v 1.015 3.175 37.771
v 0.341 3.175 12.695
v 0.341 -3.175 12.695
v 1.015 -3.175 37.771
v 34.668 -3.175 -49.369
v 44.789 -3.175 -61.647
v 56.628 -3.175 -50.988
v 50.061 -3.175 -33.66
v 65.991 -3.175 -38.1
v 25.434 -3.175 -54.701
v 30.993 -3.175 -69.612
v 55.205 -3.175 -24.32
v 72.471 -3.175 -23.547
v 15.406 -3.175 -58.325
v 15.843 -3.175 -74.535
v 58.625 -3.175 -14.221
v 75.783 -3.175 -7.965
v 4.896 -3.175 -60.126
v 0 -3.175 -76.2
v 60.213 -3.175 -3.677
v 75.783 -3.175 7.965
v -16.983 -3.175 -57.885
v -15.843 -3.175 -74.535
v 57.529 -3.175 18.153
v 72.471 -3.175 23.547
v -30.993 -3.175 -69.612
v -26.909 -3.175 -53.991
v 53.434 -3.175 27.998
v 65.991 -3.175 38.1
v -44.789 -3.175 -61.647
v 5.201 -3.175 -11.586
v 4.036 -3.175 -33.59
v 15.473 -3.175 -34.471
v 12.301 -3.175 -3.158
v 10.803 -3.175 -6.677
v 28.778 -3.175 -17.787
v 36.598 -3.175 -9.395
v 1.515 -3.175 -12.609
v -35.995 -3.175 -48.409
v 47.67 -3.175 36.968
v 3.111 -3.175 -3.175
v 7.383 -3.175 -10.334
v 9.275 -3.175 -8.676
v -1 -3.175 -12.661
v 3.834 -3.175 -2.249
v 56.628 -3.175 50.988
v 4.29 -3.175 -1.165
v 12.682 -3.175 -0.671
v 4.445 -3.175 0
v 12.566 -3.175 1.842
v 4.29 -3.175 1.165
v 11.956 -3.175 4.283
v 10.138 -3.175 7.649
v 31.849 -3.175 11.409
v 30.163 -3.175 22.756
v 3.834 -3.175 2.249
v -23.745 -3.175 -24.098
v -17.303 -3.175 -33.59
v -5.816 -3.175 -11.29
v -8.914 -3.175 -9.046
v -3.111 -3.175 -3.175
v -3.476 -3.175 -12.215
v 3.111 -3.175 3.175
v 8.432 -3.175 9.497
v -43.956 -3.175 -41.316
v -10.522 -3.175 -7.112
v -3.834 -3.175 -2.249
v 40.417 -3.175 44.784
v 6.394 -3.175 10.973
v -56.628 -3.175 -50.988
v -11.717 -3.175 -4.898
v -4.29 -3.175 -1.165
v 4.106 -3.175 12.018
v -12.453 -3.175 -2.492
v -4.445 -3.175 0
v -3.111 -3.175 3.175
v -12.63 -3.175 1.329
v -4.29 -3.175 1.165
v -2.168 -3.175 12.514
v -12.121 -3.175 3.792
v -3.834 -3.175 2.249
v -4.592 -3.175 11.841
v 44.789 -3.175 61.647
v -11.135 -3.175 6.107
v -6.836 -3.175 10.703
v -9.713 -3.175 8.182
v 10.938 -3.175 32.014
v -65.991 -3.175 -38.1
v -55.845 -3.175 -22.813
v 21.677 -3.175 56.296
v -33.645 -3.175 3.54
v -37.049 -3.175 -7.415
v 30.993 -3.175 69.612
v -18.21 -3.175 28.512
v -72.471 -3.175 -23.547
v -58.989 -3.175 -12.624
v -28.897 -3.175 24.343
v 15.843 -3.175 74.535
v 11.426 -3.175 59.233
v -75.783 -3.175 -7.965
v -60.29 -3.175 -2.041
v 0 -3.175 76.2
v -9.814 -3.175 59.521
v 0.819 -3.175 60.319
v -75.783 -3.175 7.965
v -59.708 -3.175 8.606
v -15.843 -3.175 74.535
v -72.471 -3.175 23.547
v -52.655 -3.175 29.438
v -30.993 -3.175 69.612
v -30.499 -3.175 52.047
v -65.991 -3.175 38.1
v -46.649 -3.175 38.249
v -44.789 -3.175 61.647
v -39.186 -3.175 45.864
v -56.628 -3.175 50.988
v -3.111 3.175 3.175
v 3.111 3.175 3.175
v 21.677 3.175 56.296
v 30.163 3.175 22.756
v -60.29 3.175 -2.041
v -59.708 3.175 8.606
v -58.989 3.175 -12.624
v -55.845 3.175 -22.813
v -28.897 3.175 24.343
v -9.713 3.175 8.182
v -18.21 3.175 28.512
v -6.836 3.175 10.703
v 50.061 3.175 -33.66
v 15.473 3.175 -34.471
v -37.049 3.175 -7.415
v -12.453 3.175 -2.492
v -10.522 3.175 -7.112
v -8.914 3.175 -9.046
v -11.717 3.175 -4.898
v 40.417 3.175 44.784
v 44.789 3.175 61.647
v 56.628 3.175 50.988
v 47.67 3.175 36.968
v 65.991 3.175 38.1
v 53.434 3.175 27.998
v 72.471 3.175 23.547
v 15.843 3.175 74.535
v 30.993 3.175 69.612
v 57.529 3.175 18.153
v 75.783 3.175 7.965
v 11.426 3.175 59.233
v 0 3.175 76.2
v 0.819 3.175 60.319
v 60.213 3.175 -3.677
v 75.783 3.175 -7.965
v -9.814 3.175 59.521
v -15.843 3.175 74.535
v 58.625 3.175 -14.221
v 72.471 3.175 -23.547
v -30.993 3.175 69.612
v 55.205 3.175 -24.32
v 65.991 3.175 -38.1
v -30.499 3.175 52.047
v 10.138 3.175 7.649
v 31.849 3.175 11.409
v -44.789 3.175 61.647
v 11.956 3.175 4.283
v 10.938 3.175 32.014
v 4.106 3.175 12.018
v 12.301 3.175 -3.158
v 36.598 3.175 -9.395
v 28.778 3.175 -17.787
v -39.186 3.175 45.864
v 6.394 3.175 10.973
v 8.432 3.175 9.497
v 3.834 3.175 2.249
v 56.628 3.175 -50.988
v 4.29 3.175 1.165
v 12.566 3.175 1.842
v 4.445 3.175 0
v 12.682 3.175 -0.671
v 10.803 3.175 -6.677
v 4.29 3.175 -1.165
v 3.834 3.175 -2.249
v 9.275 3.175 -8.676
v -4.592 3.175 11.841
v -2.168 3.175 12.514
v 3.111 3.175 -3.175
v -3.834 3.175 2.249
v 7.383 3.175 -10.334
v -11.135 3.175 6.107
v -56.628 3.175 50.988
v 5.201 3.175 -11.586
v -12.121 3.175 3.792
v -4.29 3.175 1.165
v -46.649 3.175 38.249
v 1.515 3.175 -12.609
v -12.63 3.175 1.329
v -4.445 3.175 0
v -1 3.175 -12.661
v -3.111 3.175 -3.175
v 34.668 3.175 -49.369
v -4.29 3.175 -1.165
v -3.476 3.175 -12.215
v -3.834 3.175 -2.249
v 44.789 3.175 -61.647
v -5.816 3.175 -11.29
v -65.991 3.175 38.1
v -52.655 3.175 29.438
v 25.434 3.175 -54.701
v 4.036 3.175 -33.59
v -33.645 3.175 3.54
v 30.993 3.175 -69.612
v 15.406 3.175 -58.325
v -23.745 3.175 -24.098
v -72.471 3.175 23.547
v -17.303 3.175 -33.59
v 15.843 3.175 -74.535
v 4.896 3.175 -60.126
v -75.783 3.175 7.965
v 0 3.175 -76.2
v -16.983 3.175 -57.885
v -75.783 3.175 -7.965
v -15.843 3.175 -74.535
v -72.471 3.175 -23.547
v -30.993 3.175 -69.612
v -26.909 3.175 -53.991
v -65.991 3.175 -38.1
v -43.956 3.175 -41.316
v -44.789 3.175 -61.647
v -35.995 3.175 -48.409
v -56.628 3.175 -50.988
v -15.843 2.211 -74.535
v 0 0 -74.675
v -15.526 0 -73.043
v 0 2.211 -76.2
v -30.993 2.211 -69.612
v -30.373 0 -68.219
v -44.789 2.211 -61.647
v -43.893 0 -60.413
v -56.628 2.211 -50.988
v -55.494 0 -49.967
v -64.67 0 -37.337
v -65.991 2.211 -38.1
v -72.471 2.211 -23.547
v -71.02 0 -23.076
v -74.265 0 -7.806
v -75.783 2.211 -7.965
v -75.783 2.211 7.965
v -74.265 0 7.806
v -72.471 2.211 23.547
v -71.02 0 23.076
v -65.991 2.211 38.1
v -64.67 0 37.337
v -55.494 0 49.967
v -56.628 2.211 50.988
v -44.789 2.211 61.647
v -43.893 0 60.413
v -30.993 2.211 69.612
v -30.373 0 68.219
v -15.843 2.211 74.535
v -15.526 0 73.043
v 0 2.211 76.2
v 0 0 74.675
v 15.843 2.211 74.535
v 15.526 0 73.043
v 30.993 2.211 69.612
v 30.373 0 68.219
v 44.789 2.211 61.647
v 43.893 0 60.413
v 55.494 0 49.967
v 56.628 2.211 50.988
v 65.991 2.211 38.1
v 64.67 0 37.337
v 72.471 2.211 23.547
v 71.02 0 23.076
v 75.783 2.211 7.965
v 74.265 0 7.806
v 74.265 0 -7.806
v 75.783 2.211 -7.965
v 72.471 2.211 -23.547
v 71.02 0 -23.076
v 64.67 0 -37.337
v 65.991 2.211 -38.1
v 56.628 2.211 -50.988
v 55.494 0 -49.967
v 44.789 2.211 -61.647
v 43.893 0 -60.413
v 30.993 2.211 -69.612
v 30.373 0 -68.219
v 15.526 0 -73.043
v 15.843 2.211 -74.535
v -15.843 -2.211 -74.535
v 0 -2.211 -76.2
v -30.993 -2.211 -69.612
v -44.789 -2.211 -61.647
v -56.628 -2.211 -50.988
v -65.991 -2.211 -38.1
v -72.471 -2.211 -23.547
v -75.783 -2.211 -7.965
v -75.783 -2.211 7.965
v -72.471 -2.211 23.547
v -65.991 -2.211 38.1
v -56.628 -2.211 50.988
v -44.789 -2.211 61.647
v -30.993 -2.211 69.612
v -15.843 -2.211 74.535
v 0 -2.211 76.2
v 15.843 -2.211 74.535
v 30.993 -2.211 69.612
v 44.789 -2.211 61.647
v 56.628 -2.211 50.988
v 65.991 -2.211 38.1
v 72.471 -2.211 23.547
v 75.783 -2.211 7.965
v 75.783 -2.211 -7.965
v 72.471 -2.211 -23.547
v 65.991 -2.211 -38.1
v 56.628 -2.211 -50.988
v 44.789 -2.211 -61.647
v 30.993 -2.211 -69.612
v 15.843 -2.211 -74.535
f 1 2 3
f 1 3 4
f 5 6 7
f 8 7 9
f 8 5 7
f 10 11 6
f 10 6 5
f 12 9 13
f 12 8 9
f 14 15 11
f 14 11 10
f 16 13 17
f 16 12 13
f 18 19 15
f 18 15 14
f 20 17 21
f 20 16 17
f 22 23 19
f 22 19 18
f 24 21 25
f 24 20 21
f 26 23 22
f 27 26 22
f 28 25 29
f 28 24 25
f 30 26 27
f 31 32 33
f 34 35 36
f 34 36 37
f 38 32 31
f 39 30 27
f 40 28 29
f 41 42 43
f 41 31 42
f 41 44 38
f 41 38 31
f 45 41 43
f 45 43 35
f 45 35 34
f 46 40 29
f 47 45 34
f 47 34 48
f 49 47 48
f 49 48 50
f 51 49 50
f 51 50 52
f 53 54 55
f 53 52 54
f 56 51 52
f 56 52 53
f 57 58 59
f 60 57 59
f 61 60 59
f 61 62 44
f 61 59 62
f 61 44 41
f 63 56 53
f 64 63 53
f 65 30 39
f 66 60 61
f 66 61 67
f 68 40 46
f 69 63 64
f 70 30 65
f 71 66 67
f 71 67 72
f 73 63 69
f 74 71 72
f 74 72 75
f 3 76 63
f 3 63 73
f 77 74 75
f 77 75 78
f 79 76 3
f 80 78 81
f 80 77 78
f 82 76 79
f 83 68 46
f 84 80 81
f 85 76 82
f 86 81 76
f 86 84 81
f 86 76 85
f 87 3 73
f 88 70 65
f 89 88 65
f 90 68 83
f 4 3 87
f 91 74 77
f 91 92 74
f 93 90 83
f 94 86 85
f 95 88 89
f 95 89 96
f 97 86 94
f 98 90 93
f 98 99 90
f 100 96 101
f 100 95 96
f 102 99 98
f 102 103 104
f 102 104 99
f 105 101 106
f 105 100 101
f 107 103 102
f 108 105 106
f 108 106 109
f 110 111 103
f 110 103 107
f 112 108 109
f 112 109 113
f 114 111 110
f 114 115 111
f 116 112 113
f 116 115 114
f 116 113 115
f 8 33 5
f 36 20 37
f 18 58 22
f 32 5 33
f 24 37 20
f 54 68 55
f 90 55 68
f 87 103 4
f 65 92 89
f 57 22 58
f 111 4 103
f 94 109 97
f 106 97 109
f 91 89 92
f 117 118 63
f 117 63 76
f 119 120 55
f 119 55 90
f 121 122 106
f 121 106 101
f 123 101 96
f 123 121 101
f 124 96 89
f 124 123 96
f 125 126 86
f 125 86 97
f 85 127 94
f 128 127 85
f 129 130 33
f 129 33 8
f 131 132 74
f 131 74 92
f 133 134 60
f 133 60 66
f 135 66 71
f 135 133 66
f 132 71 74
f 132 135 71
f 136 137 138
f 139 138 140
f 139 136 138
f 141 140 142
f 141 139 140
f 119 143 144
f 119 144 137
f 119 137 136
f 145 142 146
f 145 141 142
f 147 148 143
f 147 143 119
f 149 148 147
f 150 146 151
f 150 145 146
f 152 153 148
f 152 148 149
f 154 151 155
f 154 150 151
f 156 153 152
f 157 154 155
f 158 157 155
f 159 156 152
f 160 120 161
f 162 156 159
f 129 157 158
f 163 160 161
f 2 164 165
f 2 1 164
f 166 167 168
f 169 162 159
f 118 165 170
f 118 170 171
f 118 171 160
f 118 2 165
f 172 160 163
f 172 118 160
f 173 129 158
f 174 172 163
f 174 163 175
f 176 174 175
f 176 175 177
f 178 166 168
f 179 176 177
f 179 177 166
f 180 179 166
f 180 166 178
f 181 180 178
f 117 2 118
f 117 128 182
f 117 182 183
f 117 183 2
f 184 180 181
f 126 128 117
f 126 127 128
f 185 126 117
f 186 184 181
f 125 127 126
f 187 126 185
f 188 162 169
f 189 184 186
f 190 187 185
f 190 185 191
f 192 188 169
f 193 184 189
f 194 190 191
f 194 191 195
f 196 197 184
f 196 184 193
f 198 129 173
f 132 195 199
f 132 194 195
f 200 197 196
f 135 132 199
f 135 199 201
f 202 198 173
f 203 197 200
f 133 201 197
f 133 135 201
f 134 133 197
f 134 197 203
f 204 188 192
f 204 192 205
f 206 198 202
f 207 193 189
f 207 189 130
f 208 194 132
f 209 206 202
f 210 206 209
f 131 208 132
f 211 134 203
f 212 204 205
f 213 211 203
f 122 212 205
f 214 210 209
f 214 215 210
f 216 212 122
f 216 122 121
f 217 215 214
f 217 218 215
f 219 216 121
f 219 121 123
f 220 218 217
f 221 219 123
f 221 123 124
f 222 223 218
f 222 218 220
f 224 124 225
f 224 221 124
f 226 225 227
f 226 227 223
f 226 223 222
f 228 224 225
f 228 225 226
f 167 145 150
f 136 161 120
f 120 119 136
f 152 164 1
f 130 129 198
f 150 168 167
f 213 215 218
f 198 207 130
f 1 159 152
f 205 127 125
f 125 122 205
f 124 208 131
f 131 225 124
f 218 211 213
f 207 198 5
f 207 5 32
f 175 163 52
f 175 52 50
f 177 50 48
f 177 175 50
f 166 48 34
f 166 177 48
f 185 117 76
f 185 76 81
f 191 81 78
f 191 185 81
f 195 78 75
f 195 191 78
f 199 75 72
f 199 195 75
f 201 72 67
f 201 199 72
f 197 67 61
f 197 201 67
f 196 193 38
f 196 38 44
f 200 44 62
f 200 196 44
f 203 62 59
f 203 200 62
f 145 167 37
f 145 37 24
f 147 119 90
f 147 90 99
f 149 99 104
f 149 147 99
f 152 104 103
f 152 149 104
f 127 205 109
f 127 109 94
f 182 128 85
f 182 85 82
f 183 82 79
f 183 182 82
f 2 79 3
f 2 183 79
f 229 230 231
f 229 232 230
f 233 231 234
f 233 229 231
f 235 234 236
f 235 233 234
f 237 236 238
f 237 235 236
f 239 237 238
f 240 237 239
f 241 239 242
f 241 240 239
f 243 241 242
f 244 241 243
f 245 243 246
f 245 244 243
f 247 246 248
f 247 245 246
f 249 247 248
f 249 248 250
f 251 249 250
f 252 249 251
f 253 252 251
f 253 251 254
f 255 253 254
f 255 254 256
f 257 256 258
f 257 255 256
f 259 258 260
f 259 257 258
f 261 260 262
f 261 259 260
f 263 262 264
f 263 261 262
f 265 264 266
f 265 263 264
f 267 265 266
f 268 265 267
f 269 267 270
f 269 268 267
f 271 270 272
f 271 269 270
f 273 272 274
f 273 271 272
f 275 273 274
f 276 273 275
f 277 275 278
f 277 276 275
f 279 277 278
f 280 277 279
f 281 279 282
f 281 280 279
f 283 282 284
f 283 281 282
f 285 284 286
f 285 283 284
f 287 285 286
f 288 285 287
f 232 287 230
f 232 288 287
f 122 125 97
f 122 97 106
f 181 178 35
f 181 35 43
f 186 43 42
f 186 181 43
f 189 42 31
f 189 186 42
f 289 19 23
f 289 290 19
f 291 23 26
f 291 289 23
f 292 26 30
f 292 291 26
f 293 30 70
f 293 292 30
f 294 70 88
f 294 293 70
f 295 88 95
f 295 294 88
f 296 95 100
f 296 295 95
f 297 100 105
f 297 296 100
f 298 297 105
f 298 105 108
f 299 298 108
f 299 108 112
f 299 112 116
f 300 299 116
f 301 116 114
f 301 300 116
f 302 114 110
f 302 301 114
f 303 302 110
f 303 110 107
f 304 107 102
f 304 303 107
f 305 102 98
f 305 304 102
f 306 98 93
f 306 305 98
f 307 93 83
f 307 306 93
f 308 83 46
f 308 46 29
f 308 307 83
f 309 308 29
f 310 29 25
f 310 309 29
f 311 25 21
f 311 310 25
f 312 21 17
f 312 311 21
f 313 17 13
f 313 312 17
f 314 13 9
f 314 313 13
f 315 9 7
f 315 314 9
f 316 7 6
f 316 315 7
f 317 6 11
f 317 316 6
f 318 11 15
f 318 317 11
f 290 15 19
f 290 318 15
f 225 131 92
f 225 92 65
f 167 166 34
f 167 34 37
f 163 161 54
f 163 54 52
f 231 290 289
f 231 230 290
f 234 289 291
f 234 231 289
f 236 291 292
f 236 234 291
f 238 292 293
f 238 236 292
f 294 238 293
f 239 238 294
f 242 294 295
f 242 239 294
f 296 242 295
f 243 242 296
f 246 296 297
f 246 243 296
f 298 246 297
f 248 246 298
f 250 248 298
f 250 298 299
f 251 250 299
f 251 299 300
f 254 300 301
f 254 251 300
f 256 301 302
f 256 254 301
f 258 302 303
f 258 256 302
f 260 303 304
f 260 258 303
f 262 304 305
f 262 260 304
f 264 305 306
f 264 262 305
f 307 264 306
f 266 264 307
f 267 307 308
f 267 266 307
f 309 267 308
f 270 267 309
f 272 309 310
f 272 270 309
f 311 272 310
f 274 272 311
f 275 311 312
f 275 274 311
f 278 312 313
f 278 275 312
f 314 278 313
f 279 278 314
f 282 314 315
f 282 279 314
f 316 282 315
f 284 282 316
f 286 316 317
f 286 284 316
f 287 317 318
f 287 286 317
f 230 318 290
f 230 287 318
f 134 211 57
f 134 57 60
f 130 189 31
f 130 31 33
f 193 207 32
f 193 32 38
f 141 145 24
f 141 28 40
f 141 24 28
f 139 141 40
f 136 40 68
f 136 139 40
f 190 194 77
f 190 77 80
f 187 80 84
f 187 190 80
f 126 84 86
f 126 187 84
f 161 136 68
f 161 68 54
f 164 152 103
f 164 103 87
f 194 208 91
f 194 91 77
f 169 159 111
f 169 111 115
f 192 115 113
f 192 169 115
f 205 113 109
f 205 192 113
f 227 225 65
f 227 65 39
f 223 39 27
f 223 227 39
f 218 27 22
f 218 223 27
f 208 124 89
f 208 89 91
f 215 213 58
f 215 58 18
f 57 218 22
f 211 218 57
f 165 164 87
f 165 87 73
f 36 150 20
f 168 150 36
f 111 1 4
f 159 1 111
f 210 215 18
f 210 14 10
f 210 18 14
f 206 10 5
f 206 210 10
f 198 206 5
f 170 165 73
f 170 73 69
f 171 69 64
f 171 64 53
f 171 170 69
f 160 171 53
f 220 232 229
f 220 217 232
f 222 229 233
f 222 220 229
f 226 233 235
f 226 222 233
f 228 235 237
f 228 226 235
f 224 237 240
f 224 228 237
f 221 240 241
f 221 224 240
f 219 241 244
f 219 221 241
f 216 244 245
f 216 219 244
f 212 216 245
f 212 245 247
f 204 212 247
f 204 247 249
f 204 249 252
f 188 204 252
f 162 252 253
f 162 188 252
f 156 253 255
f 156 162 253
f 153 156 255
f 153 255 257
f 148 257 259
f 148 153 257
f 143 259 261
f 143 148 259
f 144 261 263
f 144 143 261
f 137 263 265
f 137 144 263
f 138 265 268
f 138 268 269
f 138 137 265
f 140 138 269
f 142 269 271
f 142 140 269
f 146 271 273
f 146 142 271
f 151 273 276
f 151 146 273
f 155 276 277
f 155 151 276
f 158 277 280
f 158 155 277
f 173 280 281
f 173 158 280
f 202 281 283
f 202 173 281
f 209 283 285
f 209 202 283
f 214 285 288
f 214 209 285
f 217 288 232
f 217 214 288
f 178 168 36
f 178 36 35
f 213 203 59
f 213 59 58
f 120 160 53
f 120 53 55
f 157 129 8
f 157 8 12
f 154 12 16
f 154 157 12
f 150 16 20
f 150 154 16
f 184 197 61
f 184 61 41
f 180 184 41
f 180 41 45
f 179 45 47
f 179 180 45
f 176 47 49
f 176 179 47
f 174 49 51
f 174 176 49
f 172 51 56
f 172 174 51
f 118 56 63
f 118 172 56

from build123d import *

# Parameters (mm, degrees)
CUT_EXTRUDE1_DEPTH = 7.35


with BuildPart() as part:
    # Sketch1 → Revolve1 (revolve)
    with BuildSketch(Plane(origin=(0, 0, 0), x_dir=(0, 0, -1), z_dir=(1, 0, 0))):
        Polygon((74.67454347, 0), (76.2, 2.210784201), (76.2, 3.175), (0, 3.175), (0, -3.175), (76.2, -3.175), (76.2, -2.210784201), align=None)
    revolve(axis=Axis((0, -3.175, 0), (0, 1, 0)))

    # Sketch2 → Cut-Extrude1 (cut, through all)
    with BuildSketch(Plane(origin=(0, 3.175, 0), x_dir=(1, 0, 0), z_dir=(0, 1, 0))):
        with BuildLine():
            Line((-3.110851973, 3.175), (3.110851973, 3.175))
            ThreePointArc((3.110851973, 3.175), (4.445, 0), (3.110851973, -3.175))
            Line((3.110851973, -3.175), (-3.110851973, -3.175))
            ThreePointArc((-3.110851973, -3.175), (-4.445, 0), (-3.110851973, 3.175))
        make_face()
        with BuildLine():
            Line((-17.302740061, 33.589551898), (4.896011221, 60.125990213))
            ThreePointArc((4.896011221, 60.125990213), (20.500009374, 56.734956073), (34.667618402, 49.368632342))
            Line((34.667618402, 49.368632342), (4.035924256, 33.589551898))
            Line((4.035924256, 33.589551898), (1.51506049, 12.609305759))
            ThreePointArc((1.51506049, 12.609305759), (-2.249253525, 12.49923432), (-5.815791429, 11.290109391))
            Line((-5.815791429, 11.290109391), (-17.302740061, 33.589551898))
        make_face()
        with BuildLine():
            Line((15.473287184, 34.470569971), (50.061005129, 33.660086013))
            ThreePointArc((50.061005129, 33.660086013), (57.138721597, 19.346113801), (60.21285754, 3.676603308))
            Line((60.21285754, 3.676603308), (28.777726771, 17.787330414))
            Line((28.777726771, 17.787330414), (10.802976979, 6.67725156))
            ThreePointArc((10.802976979, 6.67725156), (8.369908264, 9.551682347), (5.200876316, 11.586236902))
            Line((5.200876316, 11.586236902), (15.473287184, 34.470569971))
        make_face()
        with BuildLine():
            Line((36.597613582, 9.394545783), (57.529041117, -18.152549495))
            ThreePointArc((57.529041117, -18.152549495), (50.75081104, -32.610746752), (40.416586831, -44.783983006))
            Line((40.416586831, -44.783983006), (31.849314069, -11.409113668))
            Line((31.849314069, -11.409113668), (11.956031462, -4.282909254))
            ThreePointArc((11.956031462, -4.282909254), (12.686358414, -0.588481252), (12.301178117, 3.15769171))
            Line((12.301178117, 3.15769171), (36.597613582, 9.394545783))
        make_face()
        with BuildLine():
            Line((30.163190498, -22.755762993), (21.676535765, -56.295944989))
            ThreePointArc((21.676535765, -56.295944989), (6.146504642, -60.011049863), (-9.814198109, -59.52131669))
            Line((-9.814198109, -59.52131669), (10.937718265, -32.014262454))
            Line((10.937718265, -32.014262454), (4.105950396, -12.017952045))
            ThreePointArc((4.105950396, -12.017952045), (7.449721924, -10.285506465), (10.138441898, -7.648659745))
            Line((10.138441898, -7.648659745), (30.163190498, -22.755762993))
        make_face()
        with BuildLine():
            Line((1.015269752, -37.770518102), (-30.498843139, -52.047345679))
            ThreePointArc((-30.498843139, -52.047345679), (-43.086245118, -42.221808425), (-52.6546917, -29.437884892))
            Line((-52.6546917, -29.437884892), (-18.210202481, -28.512018641))
            Line((-18.210202481, -28.512018641), (-6.835995065, -10.703231824))
            ThreePointArc((-6.835995065, -10.703231824), (-3.396707121, -12.237335524), (0.341252143, -12.695414407))
            Line((0.341252143, -12.695414407), (1.015269752, -37.770518102))
        make_face()
        with BuildLine():
            Line((-28.897169825, -24.343302703), (-59.707971096, -8.606033499))
            ThreePointArc((-59.707971096, -8.606033499), (-59.874173504, 7.361315925), (-55.845128481, 22.812874653))
            Line((-55.845128481, 22.812874653), (-33.645469338, -3.539643251))
            Line((-33.645469338, -3.539643251), (-12.630296812, -1.328759734))
            ThreePointArc((-12.630296812, -1.328759734), (-11.685346424, -4.974201337), (-9.712907436, -8.182263082))
            Line((-9.712907436, -8.182263082), (-28.897169825, -24.343302703))
        make_face()
        with BuildLine():
            Line((-37.049451129, 7.414916145), (-43.955778997, 41.315797436))
            ThreePointArc((-43.955778997, 41.315797436), (-31.575628032, 51.40121924), (-16.983044483, 57.885074286))
            Line((-16.983044483, 57.885074286), (-23.745011542, 24.098155702))
            Line((-23.745011542, 24.098155702), (-8.913727449, 9.046295538))
            ThreePointArc((-8.913727449, 9.046295538), (-11.174681532, 6.034607912), (-12.453049608, 2.492299232))
            Line((-12.453049608, 2.492299232), (-37.049451129, 7.414916145))
        make_face()
    extrude(amount=-CUT_EXTRUDE1_DEPTH, mode=Mode.SUBTRACT)


solid = part.part
